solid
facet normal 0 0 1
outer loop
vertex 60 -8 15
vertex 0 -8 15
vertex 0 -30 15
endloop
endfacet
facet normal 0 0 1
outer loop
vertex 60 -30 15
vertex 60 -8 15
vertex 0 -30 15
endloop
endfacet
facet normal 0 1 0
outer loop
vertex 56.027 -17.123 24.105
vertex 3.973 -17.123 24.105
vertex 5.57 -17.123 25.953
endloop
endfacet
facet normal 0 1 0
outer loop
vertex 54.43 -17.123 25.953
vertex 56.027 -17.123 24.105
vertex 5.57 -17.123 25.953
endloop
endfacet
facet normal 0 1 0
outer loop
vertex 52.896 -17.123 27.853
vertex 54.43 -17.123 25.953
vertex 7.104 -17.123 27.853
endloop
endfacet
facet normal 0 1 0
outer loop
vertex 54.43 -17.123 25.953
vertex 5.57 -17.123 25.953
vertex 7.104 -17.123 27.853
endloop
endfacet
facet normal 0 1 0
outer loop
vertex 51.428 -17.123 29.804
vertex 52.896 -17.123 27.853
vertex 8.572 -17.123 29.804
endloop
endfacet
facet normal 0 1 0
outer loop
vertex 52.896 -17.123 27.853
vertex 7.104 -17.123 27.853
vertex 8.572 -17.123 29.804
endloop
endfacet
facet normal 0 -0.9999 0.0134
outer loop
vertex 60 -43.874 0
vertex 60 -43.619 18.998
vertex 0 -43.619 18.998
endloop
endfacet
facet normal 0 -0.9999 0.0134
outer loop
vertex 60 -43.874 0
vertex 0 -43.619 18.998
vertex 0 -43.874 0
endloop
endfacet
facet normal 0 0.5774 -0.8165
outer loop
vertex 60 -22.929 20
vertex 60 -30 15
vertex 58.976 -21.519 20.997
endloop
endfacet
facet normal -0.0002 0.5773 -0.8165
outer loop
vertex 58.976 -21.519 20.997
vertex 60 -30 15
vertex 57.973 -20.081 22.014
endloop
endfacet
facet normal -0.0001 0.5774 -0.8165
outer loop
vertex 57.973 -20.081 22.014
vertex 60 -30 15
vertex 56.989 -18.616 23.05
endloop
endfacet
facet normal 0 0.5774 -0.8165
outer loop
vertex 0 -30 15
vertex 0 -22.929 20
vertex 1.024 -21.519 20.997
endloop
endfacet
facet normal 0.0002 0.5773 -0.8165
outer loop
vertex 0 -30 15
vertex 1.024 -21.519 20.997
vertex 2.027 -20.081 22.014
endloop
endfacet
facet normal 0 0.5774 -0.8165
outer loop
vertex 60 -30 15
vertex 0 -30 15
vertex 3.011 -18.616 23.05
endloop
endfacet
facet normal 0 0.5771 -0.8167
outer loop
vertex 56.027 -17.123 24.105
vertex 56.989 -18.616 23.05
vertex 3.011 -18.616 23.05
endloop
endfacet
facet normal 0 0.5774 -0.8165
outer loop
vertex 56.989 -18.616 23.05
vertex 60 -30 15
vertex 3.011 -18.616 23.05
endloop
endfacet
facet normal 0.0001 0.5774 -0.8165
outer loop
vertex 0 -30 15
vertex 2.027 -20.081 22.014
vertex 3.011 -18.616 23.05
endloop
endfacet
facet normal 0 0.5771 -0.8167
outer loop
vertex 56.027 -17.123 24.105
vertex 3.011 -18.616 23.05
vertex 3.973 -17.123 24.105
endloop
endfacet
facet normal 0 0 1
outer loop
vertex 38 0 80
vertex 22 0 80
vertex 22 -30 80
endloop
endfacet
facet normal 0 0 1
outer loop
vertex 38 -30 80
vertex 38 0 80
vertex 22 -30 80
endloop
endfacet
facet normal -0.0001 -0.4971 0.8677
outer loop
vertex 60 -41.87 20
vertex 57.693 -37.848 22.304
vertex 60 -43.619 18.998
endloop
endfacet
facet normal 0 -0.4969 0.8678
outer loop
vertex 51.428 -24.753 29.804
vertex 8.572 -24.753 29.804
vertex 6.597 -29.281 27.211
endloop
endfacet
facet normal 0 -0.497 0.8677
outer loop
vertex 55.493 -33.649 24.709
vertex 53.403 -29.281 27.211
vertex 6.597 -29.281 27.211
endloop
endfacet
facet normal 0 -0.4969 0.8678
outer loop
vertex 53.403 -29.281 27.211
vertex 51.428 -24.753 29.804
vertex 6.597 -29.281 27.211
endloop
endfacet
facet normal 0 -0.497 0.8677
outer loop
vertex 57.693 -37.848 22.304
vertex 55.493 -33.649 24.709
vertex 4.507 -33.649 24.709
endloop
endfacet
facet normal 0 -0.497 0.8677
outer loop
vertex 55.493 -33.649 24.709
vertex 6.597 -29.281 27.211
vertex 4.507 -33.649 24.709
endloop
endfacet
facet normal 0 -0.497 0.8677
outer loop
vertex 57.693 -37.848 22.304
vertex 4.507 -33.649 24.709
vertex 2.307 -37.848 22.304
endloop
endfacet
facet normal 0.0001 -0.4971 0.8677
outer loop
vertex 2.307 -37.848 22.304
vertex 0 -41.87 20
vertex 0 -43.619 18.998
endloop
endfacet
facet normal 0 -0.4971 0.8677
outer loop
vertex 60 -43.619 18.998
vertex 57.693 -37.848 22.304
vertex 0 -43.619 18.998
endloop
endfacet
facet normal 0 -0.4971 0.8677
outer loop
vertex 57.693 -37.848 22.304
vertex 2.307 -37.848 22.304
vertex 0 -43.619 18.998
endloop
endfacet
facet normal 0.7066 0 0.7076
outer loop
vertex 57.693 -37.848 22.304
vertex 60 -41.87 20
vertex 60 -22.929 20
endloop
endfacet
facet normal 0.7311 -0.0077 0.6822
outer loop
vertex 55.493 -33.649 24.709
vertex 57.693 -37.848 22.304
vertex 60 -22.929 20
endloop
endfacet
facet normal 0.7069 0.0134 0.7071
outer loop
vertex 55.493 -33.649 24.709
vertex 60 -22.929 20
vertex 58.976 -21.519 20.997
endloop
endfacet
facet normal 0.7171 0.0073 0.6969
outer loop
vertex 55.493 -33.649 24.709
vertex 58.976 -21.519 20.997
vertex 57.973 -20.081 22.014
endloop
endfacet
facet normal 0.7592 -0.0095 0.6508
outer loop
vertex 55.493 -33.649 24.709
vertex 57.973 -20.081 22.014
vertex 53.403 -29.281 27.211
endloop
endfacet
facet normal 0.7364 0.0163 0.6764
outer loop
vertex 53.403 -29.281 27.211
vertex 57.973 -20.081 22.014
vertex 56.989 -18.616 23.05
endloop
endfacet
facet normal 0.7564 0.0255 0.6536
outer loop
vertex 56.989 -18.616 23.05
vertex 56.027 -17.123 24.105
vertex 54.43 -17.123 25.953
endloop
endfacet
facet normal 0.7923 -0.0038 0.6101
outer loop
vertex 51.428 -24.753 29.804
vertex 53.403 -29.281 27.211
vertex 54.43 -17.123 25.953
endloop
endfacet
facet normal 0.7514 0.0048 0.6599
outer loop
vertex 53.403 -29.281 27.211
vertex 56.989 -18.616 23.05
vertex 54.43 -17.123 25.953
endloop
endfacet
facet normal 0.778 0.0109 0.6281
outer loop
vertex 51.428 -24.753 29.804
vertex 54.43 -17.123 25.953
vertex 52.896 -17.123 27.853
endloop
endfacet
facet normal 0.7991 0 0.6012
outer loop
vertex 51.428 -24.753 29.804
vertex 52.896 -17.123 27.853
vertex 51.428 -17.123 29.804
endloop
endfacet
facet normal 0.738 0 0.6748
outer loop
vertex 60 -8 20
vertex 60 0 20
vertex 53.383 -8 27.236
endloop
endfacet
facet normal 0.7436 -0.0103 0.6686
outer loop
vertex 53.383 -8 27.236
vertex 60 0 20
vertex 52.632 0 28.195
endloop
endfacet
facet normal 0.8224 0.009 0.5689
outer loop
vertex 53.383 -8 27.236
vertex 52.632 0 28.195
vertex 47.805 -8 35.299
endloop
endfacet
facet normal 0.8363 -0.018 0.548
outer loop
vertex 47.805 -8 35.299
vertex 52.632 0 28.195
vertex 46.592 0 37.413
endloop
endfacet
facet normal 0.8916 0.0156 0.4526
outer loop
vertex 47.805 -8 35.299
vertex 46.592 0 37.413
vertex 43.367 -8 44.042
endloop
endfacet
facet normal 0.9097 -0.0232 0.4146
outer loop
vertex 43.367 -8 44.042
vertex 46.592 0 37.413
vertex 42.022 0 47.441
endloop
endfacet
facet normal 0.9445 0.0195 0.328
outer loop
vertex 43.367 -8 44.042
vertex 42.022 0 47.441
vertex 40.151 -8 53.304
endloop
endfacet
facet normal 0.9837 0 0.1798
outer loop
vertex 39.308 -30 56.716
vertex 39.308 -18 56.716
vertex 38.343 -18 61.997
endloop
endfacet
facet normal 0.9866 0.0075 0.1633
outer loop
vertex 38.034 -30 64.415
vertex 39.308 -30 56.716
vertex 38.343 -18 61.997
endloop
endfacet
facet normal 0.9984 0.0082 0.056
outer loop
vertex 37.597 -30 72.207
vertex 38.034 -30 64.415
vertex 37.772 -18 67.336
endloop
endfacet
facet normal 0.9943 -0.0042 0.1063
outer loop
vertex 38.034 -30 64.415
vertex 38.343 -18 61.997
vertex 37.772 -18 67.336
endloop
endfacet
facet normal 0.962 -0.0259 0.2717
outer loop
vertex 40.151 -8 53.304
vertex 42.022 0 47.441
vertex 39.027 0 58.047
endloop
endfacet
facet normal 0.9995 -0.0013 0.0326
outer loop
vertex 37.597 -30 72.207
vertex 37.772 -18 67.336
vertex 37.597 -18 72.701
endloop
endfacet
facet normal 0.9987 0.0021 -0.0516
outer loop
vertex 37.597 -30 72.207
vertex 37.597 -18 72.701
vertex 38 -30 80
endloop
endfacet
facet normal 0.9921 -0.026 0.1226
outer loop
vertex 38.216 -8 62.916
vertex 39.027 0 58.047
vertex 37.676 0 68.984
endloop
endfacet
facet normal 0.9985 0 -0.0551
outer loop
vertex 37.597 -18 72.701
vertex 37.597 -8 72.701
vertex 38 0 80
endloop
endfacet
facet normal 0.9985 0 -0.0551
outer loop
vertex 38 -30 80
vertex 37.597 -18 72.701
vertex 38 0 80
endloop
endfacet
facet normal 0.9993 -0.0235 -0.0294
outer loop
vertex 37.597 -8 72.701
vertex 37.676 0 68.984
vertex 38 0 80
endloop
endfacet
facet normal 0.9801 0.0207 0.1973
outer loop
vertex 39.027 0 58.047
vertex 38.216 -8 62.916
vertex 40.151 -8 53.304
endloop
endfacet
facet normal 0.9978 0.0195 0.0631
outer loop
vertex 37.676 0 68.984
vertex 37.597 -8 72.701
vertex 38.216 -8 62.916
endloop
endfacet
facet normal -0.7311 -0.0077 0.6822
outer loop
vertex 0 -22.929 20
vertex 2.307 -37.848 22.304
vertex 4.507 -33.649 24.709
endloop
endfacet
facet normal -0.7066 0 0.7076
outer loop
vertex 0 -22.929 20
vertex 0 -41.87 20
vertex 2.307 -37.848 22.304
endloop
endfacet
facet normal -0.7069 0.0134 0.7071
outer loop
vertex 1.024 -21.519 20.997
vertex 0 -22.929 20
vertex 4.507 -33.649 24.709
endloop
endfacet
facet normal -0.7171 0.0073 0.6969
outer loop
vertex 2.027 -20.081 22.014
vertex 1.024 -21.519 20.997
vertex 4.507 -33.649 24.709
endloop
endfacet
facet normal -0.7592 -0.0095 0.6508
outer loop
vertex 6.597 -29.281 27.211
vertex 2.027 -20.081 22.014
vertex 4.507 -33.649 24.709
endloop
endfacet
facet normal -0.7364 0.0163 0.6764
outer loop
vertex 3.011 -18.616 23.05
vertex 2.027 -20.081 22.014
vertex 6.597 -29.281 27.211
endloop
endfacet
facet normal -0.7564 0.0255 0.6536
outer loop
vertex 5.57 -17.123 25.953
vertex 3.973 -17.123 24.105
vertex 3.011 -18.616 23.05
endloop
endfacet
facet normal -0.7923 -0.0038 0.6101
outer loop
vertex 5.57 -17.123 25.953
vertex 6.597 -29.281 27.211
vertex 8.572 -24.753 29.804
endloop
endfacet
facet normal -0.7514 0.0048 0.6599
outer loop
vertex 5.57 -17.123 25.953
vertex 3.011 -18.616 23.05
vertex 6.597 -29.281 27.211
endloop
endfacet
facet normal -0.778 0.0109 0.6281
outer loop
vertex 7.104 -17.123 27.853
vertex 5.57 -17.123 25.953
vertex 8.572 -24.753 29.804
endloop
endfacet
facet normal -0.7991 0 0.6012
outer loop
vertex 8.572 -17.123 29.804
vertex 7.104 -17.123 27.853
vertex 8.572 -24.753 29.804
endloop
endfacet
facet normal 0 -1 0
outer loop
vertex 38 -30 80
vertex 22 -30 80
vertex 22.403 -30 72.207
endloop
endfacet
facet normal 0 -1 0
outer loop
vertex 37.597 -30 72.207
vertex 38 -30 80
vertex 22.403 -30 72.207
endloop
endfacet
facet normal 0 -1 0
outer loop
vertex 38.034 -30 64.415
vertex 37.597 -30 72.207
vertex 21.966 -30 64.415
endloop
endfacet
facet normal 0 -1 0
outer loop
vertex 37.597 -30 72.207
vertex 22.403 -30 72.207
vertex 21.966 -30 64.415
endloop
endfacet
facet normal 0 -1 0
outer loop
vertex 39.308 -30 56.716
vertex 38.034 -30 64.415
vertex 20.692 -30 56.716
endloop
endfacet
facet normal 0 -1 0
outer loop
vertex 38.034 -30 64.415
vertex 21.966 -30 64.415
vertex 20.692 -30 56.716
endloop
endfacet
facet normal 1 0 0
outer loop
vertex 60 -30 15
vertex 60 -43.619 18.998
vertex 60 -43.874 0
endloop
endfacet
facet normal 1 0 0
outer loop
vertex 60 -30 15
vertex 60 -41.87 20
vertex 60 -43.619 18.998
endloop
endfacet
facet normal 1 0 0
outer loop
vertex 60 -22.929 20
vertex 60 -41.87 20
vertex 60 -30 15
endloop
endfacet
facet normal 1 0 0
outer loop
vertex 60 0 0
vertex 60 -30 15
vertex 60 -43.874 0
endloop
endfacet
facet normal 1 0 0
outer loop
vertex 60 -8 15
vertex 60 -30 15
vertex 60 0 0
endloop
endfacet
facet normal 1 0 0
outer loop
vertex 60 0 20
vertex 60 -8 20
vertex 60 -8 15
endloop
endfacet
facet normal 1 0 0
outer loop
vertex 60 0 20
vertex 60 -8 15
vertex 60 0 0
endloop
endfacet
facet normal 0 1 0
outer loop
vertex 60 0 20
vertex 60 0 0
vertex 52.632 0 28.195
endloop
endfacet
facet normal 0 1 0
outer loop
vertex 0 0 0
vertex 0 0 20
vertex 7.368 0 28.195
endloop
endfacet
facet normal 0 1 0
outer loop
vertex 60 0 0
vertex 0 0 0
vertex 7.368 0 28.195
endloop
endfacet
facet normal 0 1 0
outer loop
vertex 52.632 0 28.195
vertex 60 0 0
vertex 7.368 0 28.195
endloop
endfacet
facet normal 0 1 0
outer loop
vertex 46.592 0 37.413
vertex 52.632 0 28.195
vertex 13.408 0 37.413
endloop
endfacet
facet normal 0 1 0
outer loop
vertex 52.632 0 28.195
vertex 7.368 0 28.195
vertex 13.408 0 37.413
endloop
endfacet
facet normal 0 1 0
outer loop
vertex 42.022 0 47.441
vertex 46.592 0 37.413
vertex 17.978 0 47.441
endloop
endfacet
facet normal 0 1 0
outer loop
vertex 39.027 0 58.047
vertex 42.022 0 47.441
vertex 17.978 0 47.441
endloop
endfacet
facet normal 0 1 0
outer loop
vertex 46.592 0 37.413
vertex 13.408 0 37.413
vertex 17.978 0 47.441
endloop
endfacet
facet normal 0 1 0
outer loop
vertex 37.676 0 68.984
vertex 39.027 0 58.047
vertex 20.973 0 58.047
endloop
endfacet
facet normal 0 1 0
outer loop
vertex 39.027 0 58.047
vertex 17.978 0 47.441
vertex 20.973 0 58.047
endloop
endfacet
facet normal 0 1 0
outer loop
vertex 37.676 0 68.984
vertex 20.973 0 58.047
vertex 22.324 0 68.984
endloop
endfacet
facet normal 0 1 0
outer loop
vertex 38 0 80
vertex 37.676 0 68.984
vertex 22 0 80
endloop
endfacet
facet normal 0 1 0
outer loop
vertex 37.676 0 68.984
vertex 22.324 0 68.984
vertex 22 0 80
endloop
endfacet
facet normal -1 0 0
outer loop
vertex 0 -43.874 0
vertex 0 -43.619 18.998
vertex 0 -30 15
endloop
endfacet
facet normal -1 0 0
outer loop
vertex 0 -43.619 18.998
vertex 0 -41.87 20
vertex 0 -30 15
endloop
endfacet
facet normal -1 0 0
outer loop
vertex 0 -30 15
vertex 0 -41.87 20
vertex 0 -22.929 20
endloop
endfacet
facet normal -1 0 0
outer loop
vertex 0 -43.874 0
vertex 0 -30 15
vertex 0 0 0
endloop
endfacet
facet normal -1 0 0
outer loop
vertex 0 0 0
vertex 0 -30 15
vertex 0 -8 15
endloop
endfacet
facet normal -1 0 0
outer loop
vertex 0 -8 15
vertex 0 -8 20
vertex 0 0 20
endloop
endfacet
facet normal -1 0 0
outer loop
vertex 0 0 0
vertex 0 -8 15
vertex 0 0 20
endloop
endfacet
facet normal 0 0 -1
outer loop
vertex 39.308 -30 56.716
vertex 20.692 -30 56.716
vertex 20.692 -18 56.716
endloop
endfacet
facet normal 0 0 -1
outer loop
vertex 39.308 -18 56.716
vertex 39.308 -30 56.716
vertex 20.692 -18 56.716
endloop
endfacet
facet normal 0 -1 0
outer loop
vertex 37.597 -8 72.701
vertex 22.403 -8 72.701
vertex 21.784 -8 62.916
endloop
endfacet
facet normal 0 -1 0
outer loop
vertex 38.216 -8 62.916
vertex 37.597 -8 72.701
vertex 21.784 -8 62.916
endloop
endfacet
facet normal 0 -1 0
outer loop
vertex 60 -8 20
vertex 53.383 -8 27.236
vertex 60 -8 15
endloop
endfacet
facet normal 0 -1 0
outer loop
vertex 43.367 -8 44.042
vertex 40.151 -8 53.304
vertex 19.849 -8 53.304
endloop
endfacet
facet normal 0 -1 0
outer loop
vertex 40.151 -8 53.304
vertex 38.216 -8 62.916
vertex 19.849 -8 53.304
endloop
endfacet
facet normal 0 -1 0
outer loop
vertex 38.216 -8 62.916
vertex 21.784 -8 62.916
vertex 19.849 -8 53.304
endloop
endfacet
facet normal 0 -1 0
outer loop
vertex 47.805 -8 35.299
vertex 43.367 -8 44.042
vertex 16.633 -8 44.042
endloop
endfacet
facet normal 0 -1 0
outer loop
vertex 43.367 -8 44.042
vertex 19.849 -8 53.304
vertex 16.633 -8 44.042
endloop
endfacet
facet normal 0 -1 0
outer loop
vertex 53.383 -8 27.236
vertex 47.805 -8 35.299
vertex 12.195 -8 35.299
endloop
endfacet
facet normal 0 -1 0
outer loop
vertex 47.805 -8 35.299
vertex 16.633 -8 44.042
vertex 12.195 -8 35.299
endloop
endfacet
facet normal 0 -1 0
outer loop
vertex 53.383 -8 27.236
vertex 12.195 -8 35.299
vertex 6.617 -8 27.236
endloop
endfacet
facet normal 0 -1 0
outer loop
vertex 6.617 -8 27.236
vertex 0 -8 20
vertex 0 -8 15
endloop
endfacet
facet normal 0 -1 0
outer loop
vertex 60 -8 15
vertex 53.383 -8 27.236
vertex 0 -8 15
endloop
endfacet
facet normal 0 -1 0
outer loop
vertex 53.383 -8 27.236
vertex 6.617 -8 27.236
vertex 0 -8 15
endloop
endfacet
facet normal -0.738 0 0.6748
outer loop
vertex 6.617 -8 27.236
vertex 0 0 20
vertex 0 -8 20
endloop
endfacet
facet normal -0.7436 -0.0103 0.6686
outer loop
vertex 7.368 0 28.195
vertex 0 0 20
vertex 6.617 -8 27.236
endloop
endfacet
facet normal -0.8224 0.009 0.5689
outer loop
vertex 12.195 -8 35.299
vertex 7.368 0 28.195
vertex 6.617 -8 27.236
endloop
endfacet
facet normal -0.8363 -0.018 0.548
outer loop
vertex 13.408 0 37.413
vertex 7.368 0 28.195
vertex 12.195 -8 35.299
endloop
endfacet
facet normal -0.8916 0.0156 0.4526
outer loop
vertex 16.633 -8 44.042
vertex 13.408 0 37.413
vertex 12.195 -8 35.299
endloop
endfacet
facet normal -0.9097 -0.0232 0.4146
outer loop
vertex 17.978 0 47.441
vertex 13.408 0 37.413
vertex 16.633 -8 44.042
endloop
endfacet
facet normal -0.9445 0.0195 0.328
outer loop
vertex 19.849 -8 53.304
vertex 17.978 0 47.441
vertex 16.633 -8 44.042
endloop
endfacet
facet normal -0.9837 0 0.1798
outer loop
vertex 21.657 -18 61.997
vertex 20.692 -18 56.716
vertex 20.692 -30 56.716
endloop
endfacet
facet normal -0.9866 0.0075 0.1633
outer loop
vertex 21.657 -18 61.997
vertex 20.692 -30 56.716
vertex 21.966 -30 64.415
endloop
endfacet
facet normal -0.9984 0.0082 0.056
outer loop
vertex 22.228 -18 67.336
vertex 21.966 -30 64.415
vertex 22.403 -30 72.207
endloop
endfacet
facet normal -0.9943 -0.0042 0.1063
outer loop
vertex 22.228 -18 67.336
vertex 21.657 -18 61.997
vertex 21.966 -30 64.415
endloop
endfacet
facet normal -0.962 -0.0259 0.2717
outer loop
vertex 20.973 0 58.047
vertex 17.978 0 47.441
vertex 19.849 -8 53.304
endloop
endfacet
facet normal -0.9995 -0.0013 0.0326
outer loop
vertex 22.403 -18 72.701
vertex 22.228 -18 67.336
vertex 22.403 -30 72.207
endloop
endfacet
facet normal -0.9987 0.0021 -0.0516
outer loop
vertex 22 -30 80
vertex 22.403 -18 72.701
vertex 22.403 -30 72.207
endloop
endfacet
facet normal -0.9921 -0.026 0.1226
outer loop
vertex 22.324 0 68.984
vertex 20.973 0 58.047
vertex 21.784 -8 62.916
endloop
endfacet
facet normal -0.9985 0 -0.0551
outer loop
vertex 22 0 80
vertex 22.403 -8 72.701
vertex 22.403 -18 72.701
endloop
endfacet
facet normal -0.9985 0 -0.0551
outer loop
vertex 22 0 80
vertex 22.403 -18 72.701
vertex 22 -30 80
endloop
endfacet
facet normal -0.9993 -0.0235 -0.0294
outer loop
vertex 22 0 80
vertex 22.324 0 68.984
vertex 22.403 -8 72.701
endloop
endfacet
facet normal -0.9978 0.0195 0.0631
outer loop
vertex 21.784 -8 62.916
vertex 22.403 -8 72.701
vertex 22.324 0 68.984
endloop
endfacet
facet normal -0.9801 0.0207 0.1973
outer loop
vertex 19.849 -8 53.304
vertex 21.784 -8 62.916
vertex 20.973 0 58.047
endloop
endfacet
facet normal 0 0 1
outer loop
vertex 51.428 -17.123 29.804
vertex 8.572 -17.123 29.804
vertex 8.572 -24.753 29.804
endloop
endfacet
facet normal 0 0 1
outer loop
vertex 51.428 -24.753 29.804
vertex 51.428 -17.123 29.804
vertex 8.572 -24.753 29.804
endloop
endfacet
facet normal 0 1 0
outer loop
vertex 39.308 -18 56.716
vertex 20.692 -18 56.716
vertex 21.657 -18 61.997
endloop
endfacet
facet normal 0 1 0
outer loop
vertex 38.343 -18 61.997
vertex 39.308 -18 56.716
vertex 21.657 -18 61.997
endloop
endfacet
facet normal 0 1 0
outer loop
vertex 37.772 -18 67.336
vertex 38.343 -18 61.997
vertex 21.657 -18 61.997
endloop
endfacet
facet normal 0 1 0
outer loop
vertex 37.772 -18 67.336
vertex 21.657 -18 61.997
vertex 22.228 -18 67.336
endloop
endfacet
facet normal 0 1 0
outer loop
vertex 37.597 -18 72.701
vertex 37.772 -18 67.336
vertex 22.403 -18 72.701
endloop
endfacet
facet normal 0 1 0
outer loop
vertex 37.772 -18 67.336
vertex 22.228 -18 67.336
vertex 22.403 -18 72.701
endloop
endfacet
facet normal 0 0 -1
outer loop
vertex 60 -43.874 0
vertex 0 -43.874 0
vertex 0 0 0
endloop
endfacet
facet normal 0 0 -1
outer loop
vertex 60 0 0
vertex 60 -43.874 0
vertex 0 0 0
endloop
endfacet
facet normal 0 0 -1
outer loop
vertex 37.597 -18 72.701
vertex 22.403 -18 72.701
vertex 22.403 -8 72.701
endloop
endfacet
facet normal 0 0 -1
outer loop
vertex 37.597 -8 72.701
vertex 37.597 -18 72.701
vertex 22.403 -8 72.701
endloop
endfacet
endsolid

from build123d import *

# Parameters (mm, degrees)
F1_DEPTH = 60
F3_DEPTH = 43.8751131995


# Not quite as in the source:
# - a pattern or mirror of a feature is missing from the dataset's text; its kind, count and spacing are read off the source's solid


with BuildPart() as f1:
    # F0 (on Right) → F1 (new body)
    with BuildSketch(Plane.YZ):
        Polygon((-43.8741131995, 0), (0, 0), (0, 80), (-30, 80), (-30, 56.7161887884), (-18, 56.7161887884), (-18, 72.701357305), (-8, 72.701357305), (-8, 15), (-30, 15), (-17.1229156852, 24.1054718941), (-17.1229156852, 29.8044607043), (-24.7526019812, 29.8044607043), (-43.619140311, 18.9982891026), align=None)
    extrude(amount=F1_DEPTH)

    # F2 (on face) → F3 (cut, through all)
    with BuildSketch(Plane(origin=(0, 0, 0), x_dir=(-1, 0, 0), z_dir=(0, 1, 0))):
        with BuildLine():
            Line((-60, 80), (-60, 20))
            ThreePointArc((-60, 20), (-42.0220624026, 47.4414228809), (-38, 80))
            Line((-38, 80), (-60, 80))
        make_face()
    f3 = extrude(amount=-F3_DEPTH, mode=Mode.SUBTRACT)

    # F3_copies: F3 across plane
    add(f3.mirror(Plane(origin=(30, 0, 0), x_dir=(0, 0, -1), z_dir=(-1, 0, 0))), mode=Mode.SUBTRACT)


solid = f1.part
